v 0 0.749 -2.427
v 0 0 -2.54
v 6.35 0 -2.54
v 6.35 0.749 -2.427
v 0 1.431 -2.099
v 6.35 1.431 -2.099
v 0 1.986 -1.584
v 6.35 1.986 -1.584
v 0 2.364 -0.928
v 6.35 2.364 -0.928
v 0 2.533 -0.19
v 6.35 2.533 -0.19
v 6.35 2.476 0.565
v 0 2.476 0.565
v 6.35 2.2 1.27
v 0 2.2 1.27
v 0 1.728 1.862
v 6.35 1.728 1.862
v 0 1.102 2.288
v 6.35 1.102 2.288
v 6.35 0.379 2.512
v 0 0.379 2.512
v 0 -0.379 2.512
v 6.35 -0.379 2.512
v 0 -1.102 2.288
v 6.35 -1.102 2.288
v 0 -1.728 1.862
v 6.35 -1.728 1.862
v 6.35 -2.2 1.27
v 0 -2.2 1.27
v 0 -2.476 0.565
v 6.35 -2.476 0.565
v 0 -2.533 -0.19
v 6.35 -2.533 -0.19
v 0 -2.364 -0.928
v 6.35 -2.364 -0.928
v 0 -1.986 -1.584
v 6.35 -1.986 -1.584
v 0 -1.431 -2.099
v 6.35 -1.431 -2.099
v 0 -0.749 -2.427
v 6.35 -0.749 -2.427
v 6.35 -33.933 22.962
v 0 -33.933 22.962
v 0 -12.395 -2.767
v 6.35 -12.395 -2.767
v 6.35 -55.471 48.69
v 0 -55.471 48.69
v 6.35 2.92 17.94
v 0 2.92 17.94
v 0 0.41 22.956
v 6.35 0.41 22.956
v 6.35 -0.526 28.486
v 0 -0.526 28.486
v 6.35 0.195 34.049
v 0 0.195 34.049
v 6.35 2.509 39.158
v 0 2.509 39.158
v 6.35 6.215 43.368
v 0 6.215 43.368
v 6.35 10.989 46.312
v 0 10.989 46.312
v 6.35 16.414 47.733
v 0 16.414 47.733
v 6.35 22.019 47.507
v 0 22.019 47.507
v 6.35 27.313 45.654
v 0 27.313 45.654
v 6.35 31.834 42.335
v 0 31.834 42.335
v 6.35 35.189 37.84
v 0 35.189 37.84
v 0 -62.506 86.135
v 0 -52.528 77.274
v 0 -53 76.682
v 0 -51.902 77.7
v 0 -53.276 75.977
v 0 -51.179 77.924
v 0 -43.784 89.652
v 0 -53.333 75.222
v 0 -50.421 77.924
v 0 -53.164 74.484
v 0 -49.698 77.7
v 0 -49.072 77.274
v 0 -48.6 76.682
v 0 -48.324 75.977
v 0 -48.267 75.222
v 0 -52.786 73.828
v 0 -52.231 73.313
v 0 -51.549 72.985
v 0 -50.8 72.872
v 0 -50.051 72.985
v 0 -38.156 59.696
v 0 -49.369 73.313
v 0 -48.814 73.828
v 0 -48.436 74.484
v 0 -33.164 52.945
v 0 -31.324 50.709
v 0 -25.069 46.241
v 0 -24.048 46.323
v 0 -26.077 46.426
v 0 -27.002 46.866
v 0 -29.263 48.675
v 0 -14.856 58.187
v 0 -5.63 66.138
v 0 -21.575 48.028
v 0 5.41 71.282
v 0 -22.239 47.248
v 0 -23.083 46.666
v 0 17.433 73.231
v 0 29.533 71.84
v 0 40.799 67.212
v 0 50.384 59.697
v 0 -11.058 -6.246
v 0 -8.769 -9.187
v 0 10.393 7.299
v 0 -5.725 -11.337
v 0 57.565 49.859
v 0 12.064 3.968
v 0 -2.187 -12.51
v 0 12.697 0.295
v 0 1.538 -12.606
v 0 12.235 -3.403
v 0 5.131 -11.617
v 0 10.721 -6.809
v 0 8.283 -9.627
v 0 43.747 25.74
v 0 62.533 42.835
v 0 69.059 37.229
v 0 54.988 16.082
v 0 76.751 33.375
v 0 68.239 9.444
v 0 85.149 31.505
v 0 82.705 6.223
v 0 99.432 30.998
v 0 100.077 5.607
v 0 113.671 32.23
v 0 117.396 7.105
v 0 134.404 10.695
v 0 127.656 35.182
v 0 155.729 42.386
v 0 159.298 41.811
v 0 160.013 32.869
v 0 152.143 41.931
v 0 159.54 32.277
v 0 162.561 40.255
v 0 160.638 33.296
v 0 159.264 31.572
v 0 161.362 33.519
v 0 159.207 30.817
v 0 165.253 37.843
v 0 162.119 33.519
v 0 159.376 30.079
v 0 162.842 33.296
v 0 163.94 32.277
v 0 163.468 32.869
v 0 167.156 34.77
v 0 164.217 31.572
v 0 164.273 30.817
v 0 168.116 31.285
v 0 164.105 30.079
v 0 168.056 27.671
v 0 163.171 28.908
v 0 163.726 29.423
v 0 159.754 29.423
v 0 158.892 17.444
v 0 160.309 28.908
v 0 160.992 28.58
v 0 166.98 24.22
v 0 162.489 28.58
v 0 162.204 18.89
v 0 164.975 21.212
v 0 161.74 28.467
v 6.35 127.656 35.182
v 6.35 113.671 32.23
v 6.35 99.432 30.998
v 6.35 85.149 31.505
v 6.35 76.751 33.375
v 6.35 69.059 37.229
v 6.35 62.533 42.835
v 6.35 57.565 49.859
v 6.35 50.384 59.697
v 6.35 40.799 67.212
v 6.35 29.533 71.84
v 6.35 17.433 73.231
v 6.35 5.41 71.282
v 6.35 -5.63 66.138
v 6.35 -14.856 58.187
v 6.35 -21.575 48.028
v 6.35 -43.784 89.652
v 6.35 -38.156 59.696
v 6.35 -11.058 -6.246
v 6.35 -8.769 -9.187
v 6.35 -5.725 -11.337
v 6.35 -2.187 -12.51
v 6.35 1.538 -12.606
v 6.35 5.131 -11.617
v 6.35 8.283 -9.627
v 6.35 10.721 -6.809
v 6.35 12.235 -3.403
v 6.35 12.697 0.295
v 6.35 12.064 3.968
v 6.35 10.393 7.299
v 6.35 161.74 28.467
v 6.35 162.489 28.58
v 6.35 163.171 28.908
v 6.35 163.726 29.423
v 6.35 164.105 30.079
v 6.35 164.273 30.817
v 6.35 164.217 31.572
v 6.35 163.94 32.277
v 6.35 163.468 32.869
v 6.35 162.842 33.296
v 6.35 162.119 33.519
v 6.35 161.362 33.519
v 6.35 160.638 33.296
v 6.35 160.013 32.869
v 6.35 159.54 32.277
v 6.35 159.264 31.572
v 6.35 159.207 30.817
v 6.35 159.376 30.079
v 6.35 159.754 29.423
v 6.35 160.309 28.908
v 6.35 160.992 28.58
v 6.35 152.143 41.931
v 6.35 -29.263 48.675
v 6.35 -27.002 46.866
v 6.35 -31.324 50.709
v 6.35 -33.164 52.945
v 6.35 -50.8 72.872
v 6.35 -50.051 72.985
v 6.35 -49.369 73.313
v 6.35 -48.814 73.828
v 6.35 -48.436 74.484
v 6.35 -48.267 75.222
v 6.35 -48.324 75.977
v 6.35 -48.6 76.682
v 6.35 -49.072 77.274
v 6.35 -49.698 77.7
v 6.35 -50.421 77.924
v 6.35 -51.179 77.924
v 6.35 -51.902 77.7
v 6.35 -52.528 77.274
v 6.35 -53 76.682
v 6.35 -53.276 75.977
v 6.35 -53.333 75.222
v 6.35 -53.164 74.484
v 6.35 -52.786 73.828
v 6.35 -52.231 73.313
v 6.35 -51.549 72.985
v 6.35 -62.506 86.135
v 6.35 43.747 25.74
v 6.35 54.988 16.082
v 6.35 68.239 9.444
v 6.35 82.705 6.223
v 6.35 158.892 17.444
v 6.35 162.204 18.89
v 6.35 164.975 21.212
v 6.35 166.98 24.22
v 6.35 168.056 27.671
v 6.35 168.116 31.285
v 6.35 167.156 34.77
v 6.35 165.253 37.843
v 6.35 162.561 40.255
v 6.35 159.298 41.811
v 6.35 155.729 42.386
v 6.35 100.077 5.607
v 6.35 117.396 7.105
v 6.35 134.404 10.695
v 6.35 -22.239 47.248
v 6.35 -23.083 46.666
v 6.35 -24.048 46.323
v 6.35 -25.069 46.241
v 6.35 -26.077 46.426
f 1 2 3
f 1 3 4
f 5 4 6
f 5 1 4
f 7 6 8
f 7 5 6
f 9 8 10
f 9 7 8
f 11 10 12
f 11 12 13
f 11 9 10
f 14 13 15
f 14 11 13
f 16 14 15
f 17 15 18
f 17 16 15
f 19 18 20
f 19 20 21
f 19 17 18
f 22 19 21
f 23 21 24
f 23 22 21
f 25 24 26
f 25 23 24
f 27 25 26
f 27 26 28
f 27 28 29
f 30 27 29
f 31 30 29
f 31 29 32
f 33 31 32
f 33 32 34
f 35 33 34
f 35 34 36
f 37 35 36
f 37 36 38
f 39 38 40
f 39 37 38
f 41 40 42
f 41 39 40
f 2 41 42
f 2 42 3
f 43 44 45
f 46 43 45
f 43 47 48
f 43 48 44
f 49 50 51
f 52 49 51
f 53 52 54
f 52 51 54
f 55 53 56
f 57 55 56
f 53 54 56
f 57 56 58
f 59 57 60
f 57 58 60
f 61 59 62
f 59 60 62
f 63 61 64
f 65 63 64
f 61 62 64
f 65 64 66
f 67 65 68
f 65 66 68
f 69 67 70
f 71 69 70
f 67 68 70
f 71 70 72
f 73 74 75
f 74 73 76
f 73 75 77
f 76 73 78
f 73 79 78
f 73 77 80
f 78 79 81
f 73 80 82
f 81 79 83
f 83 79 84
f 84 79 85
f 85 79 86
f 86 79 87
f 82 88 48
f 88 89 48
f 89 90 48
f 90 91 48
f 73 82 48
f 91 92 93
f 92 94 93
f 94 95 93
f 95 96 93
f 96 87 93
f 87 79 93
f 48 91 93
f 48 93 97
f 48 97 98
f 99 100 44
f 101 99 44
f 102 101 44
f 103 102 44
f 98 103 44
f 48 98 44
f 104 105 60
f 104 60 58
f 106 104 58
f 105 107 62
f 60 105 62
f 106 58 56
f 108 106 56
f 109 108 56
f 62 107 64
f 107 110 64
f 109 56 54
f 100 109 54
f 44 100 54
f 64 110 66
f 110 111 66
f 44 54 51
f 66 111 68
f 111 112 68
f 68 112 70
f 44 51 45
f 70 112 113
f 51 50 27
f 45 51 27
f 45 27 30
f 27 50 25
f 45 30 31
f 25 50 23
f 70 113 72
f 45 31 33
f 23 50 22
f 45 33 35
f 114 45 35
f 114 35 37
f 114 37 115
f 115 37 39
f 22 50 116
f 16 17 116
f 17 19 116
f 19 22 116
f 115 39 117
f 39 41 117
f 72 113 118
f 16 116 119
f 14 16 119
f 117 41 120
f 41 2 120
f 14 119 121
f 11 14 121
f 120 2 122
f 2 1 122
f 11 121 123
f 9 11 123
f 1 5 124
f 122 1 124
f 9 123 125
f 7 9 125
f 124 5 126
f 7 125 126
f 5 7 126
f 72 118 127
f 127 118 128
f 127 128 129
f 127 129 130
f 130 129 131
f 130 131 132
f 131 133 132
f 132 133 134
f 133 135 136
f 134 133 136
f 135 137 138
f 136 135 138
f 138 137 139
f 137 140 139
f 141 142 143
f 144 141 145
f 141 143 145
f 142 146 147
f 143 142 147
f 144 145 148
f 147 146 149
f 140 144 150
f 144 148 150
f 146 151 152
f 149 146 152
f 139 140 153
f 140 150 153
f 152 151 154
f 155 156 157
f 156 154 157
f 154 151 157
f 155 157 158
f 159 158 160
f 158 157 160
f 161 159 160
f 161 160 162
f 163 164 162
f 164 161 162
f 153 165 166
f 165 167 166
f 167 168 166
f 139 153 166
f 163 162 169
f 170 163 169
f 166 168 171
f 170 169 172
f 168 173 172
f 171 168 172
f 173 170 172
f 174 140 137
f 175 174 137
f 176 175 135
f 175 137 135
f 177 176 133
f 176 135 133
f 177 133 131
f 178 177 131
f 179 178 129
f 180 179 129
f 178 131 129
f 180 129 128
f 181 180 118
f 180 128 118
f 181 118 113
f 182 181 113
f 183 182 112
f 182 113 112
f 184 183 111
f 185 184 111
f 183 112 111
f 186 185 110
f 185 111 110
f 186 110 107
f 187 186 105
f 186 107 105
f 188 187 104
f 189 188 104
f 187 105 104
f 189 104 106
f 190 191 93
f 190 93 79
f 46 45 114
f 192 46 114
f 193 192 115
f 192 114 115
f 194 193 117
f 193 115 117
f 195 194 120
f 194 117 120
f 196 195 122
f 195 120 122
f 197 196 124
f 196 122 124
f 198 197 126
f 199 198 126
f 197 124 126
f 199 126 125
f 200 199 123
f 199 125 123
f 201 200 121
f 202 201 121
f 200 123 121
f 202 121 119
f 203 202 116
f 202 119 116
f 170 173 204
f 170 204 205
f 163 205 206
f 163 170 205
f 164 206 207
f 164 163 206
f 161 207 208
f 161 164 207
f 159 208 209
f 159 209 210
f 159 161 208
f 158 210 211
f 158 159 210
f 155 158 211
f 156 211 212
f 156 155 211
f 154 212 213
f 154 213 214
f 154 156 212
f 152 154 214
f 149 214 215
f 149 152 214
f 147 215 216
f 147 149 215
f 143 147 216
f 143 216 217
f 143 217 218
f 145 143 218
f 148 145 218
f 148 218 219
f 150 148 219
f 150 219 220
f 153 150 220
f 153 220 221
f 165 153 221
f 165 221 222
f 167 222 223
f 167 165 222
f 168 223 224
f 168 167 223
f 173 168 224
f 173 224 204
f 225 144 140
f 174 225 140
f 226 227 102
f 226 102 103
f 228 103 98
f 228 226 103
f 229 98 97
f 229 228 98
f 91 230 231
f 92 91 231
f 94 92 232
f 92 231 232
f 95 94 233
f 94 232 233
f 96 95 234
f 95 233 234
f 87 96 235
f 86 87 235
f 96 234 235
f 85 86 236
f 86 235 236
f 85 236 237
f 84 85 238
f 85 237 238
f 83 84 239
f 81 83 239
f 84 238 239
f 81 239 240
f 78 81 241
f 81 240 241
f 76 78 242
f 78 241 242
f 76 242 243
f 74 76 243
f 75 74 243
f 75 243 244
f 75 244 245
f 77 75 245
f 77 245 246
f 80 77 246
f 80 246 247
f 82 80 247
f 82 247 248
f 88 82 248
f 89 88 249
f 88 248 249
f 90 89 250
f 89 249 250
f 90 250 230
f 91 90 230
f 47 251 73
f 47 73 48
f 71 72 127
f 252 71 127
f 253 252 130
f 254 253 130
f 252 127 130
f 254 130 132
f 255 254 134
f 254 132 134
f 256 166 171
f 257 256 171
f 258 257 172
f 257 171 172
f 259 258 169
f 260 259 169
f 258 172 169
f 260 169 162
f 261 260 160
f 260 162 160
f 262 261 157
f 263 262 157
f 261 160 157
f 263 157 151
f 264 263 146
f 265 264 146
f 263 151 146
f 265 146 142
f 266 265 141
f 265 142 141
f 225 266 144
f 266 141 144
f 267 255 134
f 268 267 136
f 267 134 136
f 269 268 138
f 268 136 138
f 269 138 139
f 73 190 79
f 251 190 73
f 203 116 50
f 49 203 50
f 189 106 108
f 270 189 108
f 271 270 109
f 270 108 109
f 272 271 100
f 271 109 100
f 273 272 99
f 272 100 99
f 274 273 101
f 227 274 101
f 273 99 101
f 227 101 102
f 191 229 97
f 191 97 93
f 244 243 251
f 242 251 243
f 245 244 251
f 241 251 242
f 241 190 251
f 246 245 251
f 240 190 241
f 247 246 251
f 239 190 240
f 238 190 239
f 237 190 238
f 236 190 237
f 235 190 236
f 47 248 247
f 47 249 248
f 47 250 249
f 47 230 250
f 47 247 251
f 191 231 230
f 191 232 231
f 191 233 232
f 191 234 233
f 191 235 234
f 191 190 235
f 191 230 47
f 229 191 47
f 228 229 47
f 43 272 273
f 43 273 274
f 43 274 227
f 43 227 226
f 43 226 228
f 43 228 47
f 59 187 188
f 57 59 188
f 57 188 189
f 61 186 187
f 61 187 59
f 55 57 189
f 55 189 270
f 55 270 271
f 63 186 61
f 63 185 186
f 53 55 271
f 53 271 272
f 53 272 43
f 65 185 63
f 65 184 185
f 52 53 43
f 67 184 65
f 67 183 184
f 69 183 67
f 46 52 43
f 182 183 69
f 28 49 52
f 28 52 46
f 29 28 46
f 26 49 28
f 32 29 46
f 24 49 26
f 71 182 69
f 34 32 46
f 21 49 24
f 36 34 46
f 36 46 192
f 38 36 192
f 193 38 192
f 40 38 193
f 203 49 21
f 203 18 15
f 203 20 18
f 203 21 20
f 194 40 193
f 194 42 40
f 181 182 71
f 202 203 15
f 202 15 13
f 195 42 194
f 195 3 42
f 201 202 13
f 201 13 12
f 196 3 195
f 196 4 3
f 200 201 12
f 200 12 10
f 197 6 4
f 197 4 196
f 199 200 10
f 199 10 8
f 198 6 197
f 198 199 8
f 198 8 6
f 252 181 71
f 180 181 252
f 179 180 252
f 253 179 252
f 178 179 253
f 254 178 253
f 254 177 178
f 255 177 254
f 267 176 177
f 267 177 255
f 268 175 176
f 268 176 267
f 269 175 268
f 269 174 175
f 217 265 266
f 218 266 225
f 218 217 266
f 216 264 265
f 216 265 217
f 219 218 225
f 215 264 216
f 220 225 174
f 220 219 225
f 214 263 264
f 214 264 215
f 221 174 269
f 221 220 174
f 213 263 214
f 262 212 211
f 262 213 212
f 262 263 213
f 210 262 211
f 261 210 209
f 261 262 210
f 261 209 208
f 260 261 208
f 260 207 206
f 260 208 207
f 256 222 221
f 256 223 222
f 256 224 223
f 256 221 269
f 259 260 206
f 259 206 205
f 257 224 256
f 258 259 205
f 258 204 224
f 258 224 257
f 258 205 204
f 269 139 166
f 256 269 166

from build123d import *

# Parameters (mm, degrees)
SKETCH1_R               = 2.54
BOSS_EXTRUDE1_DEPTH     = 6.35
SKETCH2_R               = 2.54
BOSS_EXTRUDE2_DEPTH     = 6.35
CUT_EXTRUDE3_DEPTH      = 191.722024651
BOSS_EXTRUDE3_START     = -6.35
BOSS_EXTRUDE3_OUTLINE_R = 2.54
BOSS_EXTRUDE3_DEPTH     = 6.35


# Read off the part's stored shape, not the designer's step: Boss-Extrude3
with BuildPart() as part:
    # Sketch1 → Boss-Extrude1 (new body)
    with BuildSketch(Plane(origin=(0, 0, 0), x_dir=(0, 0, -1), z_dir=(1, 0, 0))):
        with BuildLine():
            Line((-44.569856196, 7.632792855), (2.7669164, -12.394925318))
            ThreePointArc((2.7669164, -12.394925318), (12.623500932, 1.391842028), (0, 12.7))
            ThreePointArc((0, 12.7), (-15.936201096, 21.312567622), (-17.462784388, 39.362730221))
            ThreePointArc((-17.462784388, 39.362730221), (-5.921340573, 86.302722272), (-10.695095154, 134.404479477))
            Line((-10.695095154, 134.404479477), (-17.44376381, 158.89152649))
            ThreePointArc((-17.44376381, 158.89152649), (-33.061621644, 167.760715668), (-41.930810822, 152.142857834))
            Line((-41.930810822, 152.142857834), (-38.556476494, 139.899334328))
            Line((-38.556476494, 139.899334328), (-35.182142166, 127.655810822))
            ThreePointArc((-35.182142166, 127.655810822), (-31.257188906, 88.106825725), (-40.746496905, 49.513037183))
            ThreePointArc((-40.746496905, 49.513037183), (-46.038128876, 28.881479889), (-44.569856196, 7.632792855))
        make_face()
        Circle(SKETCH1_R, mode=Mode.SUBTRACT)
        with Locations((-31.007118959, 161.740192162)):
            Circle(SKETCH1_R, mode=Mode.SUBTRACT)
    extrude(amount=BOSS_EXTRUDE1_DEPTH)

    # Sketch2 → Boss-Extrude2 (add)
    with BuildSketch(Plane(origin=(6.35, 0, 0), x_dir=(0, 0, -1), z_dir=(1, 0, 0))):
        with BuildLine():
            Line((-44.569856196, 7.632792855), (-42.095309311, -5.538639039))
            ThreePointArc((-42.095309311, -5.538639039), (-43.548594954, -20.911029153), (-52.944669407, -33.164037021))
            Line((-52.944669407, -33.164037021), (-59.696430917, -38.15584))
            Line((-59.696430917, -38.15584), (-89.652353277, -43.783727307))
            Line((-89.652353277, -43.783727307), (-86.13492371, -62.506178782))
            Line((-86.13492371, -62.506178782), (-48.69002076, -55.471319649))
            Line((-48.69002076, -55.471319649), (2.7669164, -12.394925318))
            Line((2.7669164, -12.394925318), (-44.569856196, 7.632792855))
        make_face()
        with Locations((-75.412004177, -50.8)):
            Circle(SKETCH2_R, mode=Mode.SUBTRACT)
    extrude(amount=-BOSS_EXTRUDE2_DEPTH)

    # Sketch7 → Cut-Extrude3 (cut, through all)
    with BuildSketch(Plane(origin=(6.35, 0, 0), x_dir=(0, 0, -1), z_dir=(1, 0, 0))):
        Polygon((-46.865774263, -27.0023496), (-22.96155218, -33.933122483), (78.29652169, 5.436064098), (-6.223292372, 82.704708682), (-31.505451919, 85.148559871), (-103.235957303, 48.493013889), align=None)
    extrude(amount=-CUT_EXTRUDE3_DEPTH, mode=Mode.SUBTRACT)


with BuildPart() as cut_extrude3_piece_1:
    # of the separate pieces the step leaves, piece 1, a body of its own (cut_extrude3_pieces)
    add(part.part.solids().sort_by_distance((0, 127.655810822, 35.182142166))[0])



with BuildPart() as cut_extrude3_piece_2:
    # of the separate pieces the step leaves, piece 2, a body of its own (cut_extrude3_pieces)
    add(part.part.solids().sort_by_distance((0, -27.0023496, 46.865774263))[0])


with BuildPart() as cut_extrude3_piece_1_1:
    add(cut_extrude3_piece_1.part)

    add(cut_extrude3_piece_2.part)  # Boss-Extrude3 merges Cut-Extrude3 piece 2
    # Boss-Extrude3 outline → Boss-Extrude3 (add)
    with BuildSketch(Plane(origin=(6.35, 0, 0), x_dir=(0, 0, -1), z_dir=(1, 0, 0)).offset(BOSS_EXTRUDE3_START)):
        with BuildLine():
            ThreePointArc((-17.94031666, 2.919785972), (-45.017090497, 8.492394425), (-37.839830784, 35.188697342))
            ThreePointArc((-37.839830784, 35.188697342), (-16.082022846, 54.987957012), (-6.223292372, 82.704708682))
            Line((-6.223292372, 82.704708682), (-31.505451919, 85.148559871))
            ThreePointArc((-31.505451919, 85.148559871), (-37.228581056, 69.058602906), (-49.859288922, 57.564859346))
            ThreePointArc((-49.859288922, 57.564859346), (-73.23147922, 17.433041422), (-48.0280892, -21.574793953))
            ThreePointArc((-48.0280892, -21.574793953), (-46.322848152, -24.047848471), (-46.865774263, -27.0023496))
            Line((-46.865774263, -27.0023496), (-22.96155218, -33.933122483))
            Line((-22.96155218, -33.933122483), (2.7669164, -12.394925318))
            ThreePointArc((2.7669164, -12.394925318), (11.617144077, 5.131467967), (-7.298891252, 10.393083589))
            Line((-7.298891252, 10.393083589), (-17.94031666, 2.919785972))
        make_face()
        Circle(BOSS_EXTRUDE3_OUTLINE_R, mode=Mode.SUBTRACT)
    extrude(amount=BOSS_EXTRUDE3_DEPTH)


solid = cut_extrude3_piece_1_1.part
